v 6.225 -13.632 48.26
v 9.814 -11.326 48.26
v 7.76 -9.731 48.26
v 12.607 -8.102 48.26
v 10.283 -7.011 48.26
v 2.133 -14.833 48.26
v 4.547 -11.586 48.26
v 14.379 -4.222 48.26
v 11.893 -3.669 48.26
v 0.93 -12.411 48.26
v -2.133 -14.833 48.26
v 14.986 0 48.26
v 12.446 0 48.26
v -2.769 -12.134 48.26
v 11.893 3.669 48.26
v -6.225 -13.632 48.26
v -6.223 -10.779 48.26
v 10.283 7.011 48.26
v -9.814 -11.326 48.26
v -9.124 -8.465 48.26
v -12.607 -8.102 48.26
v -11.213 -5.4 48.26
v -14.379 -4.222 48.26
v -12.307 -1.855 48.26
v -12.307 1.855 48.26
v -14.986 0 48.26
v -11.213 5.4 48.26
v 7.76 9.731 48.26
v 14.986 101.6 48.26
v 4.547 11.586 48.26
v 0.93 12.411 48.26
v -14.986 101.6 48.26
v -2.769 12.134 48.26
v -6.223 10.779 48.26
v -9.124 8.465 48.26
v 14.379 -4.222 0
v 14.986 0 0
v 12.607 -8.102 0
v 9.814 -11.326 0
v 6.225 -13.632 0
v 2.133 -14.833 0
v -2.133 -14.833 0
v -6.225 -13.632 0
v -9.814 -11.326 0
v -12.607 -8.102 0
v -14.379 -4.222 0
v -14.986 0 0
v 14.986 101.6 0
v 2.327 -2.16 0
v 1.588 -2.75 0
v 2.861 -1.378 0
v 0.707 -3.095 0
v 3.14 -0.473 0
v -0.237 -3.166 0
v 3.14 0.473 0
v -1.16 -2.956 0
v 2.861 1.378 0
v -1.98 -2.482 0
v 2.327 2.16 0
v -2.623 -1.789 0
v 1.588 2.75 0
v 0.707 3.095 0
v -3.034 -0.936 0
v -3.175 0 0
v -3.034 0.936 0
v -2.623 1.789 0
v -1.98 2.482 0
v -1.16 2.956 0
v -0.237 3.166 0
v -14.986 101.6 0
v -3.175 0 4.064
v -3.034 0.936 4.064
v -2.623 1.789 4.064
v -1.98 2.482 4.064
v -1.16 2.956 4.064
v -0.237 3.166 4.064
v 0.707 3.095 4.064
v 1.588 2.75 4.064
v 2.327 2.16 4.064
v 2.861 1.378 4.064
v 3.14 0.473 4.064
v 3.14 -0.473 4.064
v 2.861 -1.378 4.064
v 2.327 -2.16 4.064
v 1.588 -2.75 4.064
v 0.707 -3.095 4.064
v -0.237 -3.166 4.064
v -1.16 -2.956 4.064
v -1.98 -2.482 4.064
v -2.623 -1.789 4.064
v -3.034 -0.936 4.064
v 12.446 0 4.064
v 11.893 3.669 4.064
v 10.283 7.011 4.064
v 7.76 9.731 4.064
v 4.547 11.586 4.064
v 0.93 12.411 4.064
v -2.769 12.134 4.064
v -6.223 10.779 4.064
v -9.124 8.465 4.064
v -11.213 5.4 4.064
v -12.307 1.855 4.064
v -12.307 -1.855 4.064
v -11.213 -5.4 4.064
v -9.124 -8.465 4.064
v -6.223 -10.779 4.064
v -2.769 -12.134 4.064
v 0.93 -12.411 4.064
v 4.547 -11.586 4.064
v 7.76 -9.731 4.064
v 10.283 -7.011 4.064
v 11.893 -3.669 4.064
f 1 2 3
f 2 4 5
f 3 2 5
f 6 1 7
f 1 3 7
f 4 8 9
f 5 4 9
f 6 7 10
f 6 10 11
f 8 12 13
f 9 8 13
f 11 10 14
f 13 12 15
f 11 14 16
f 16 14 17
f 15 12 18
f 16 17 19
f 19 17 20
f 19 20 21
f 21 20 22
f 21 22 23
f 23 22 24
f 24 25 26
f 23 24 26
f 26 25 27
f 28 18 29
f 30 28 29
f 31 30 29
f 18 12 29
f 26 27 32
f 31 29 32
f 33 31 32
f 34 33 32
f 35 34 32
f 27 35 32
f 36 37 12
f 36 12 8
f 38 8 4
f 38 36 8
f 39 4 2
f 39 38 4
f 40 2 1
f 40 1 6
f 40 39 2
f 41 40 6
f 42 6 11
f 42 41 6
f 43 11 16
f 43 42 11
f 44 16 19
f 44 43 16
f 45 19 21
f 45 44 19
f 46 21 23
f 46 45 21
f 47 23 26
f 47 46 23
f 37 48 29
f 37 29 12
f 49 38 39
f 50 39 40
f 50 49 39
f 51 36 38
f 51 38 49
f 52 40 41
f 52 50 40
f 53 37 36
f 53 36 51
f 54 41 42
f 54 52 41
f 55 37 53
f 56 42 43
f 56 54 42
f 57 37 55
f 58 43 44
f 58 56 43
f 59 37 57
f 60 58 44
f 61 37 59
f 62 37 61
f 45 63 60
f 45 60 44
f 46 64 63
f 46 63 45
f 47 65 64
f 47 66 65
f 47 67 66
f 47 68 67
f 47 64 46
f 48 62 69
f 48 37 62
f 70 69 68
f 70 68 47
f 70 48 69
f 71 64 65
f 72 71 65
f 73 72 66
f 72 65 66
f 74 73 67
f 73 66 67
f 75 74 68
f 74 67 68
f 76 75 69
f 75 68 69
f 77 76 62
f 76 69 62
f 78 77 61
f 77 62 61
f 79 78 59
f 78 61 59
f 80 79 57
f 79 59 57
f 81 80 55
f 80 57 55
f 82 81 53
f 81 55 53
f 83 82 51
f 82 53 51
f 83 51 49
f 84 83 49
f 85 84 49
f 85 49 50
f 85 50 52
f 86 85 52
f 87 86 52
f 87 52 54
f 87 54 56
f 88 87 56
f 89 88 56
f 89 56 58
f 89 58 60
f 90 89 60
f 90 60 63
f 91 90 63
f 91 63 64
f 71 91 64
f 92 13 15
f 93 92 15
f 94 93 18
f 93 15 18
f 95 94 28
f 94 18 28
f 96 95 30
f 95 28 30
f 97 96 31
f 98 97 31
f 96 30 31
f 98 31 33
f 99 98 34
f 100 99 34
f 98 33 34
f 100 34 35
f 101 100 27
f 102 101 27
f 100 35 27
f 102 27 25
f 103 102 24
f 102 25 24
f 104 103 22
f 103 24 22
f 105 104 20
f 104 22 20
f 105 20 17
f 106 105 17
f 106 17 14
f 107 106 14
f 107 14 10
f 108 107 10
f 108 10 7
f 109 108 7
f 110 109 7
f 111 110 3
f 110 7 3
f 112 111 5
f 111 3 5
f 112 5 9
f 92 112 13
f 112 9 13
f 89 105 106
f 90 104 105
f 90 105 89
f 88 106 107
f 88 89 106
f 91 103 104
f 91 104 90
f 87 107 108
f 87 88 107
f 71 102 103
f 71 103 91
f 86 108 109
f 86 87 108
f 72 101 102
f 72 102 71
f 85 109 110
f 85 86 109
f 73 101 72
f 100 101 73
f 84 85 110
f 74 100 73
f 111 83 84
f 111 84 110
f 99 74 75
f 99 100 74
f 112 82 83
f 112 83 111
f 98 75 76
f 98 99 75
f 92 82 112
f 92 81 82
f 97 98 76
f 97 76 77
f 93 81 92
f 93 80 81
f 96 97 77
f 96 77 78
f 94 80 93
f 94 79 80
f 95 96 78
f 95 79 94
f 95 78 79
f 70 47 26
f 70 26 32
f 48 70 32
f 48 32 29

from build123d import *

# Parameters (mm, degrees)
BOSS_EXTRUDE1_DEPTH = 48.26
SKETCH3_R           = 12.446
CUT_EXTRUDE1_DEPTH  = 44.196
SKETCH4_R           = 3.175
CUT_EXTRUDE2_DEPTH  = 40.64


with BuildPart() as part:
    # Sketch2 → Boss-Extrude1 (new body)
    with BuildSketch(Plane.XY):
        with BuildLine():
            Line((-14.986, 0), (-14.986, 101.6))
            Line((-14.986, 101.6), (14.986, 101.6))
            Line((14.986, 101.6), (14.986, 0))
            ThreePointArc((14.986, 0), (0, -14.986), (-14.986, 0))
        make_face()
    extrude(amount=BOSS_EXTRUDE1_DEPTH)

    # Sketch3 → Cut-Extrude1 (cut)
    with BuildSketch(Plane.XY.offset(48.26)):
        Circle(SKETCH3_R)
    extrude(amount=-CUT_EXTRUDE1_DEPTH, mode=Mode.SUBTRACT)

    # Sketch4 → Cut-Extrude2 (cut)
    with BuildSketch(Plane(origin=(0, 0, 0), x_dir=(-1, 0, 0), z_dir=(0, 0, -1))):
        Circle(SKETCH4_R)
    extrude(amount=-CUT_EXTRUDE2_DEPTH, mode=Mode.SUBTRACT)


solid = part.part
